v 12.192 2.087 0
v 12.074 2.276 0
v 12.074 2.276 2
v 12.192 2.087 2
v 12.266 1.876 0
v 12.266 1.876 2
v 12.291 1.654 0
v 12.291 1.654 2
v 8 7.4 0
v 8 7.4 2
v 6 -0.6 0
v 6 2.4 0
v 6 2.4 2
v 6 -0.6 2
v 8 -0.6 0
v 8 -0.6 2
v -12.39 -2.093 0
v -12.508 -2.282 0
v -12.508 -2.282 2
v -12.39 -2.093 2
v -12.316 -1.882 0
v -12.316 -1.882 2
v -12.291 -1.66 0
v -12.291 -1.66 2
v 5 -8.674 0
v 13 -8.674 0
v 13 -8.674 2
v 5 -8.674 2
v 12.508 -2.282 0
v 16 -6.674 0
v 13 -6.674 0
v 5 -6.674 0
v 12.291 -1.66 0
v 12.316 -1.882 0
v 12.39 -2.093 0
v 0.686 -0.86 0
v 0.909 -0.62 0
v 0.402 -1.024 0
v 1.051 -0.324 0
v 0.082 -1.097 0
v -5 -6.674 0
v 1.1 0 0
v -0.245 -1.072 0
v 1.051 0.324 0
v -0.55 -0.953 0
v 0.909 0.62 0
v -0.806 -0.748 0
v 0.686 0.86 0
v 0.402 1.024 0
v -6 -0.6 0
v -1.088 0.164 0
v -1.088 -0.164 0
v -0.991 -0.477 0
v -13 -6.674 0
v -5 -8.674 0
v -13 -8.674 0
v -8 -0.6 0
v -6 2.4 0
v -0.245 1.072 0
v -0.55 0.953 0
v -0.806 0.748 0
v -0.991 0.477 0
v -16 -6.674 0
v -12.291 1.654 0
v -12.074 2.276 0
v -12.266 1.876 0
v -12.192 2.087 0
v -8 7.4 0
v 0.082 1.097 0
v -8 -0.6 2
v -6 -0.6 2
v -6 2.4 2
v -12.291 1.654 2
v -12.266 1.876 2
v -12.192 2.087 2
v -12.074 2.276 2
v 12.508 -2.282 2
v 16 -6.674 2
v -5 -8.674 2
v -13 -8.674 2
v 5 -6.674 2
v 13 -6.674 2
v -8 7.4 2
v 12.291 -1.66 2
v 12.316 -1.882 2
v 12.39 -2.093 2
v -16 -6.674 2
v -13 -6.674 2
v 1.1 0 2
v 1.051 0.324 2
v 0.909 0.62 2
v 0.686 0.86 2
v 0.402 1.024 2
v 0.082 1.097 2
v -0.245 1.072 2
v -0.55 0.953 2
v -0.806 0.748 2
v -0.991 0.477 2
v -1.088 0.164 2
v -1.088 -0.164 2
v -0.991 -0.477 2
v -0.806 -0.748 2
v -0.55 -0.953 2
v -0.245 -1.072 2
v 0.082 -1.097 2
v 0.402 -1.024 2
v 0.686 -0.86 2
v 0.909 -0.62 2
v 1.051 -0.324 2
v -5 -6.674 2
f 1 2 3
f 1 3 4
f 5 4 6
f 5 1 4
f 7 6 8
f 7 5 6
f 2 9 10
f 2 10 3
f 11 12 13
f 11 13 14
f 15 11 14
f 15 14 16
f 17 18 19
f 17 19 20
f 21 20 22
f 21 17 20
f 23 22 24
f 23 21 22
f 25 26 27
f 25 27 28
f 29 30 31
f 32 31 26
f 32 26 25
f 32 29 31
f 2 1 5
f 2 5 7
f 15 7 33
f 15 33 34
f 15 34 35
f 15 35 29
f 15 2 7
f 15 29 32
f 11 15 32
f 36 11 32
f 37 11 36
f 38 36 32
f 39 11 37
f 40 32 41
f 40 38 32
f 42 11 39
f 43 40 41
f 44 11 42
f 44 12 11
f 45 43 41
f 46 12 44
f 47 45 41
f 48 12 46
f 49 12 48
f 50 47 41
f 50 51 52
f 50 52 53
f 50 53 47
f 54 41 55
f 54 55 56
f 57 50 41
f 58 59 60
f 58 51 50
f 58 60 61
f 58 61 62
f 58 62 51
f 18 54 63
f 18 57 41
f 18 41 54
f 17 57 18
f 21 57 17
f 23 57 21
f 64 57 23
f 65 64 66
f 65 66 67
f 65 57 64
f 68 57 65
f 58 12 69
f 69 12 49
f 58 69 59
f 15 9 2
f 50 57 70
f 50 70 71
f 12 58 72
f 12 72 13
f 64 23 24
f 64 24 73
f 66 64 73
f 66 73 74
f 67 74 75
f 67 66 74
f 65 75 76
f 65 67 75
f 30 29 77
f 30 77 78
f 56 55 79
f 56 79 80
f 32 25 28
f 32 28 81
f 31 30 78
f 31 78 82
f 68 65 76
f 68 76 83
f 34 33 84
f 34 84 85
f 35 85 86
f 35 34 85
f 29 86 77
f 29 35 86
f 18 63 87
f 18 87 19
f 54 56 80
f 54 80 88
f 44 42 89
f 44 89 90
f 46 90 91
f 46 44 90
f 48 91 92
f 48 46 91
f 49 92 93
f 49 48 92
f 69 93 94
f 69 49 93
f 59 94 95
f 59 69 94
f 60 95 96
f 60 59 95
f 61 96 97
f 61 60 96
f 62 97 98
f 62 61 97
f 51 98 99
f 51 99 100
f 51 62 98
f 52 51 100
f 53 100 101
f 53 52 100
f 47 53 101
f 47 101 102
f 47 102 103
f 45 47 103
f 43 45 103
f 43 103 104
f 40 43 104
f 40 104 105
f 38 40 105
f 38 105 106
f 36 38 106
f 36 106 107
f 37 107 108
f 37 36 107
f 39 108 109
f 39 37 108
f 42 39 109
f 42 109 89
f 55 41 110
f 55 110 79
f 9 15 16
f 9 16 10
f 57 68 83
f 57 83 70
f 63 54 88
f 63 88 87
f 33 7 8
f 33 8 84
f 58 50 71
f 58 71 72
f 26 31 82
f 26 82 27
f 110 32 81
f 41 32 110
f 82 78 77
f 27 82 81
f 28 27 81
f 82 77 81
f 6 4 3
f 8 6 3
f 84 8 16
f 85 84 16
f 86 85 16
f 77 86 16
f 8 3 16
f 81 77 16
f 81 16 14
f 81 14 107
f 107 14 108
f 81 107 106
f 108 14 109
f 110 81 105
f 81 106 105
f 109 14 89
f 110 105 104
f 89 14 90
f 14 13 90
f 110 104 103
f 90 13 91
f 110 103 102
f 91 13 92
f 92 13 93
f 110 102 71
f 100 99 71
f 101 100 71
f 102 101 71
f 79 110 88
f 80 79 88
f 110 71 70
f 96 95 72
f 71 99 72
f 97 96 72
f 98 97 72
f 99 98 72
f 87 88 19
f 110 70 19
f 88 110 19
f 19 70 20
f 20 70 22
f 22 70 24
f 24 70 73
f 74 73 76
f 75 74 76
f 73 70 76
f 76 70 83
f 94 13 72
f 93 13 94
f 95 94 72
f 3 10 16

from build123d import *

# Parameters (mm, degrees)
SKETCH1_R           = 1.1
BOSS_EXTRUDE1_DEPTH = 2


with BuildPart() as part:
    # Sketch1 → Boss-Extrude1 (new body)
    with BuildSketch(Plane.XY):
        with BuildLine():
            Line((5, -6.674), (-5, -6.674))
            Line((-5, -6.674), (-5, -8.674))
            Line((-5, -8.674), (-13, -8.674))
            Line((-13, -8.674), (-13, -6.674))
            Line((-13, -6.674), (-16, -6.674))
            Line((-16, -6.674), (-12.508255124, -2.282440657))
            ThreePointArc((-12.508255124, -2.282440657), (-12.346867401, -1.989679888), (-12.290989968, -1.660085322))
            Line((-12.290989968, -1.660085322), (-12.290989968, 1.65413052))
            ThreePointArc((-12.290989968, 1.65413052), (-12.235112536, 1.983725086), (-12.073724813, 2.276485855))
            Line((-12.073724813, 2.276485855), (-8, 7.4))
            Line((-8, 7.4), (-8, 2.4))
            Line((-8, 2.4), (-8, -0.6))
            Line((-8, -0.6), (-6, -0.6))
            Line((-6, -0.6), (-6, 2.4))
            Line((-6, 2.4), (6, 2.4))
            Line((6, 2.4), (6, -0.6))
            Line((6, -0.6), (8, -0.6))
            Line((8, -0.6), (8, 2.4))
            Line((8, 2.4), (8, 7.4))
            Line((8, 7.4), (12.073724813, 2.276485855))
            ThreePointArc((12.073724813, 2.276485855), (12.235112536, 1.983725086), (12.290989968, 1.65413052))
            Line((12.290989968, 1.65413052), (12.290989968, -1.660085322))
            ThreePointArc((12.290989968, -1.660085322), (12.346867401, -1.989679888), (12.508255124, -2.282440657))
            Line((12.508255124, -2.282440657), (16, -6.674))
            Line((16, -6.674), (13, -6.674))
            Line((13, -6.674), (13, -8.674))
            Line((13, -8.674), (5, -8.674))
            Line((5, -8.674), (5, -6.674))
        make_face()
        Circle(SKETCH1_R, mode=Mode.SUBTRACT)
    extrude(amount=BOSS_EXTRUDE1_DEPTH)


solid = part.part
